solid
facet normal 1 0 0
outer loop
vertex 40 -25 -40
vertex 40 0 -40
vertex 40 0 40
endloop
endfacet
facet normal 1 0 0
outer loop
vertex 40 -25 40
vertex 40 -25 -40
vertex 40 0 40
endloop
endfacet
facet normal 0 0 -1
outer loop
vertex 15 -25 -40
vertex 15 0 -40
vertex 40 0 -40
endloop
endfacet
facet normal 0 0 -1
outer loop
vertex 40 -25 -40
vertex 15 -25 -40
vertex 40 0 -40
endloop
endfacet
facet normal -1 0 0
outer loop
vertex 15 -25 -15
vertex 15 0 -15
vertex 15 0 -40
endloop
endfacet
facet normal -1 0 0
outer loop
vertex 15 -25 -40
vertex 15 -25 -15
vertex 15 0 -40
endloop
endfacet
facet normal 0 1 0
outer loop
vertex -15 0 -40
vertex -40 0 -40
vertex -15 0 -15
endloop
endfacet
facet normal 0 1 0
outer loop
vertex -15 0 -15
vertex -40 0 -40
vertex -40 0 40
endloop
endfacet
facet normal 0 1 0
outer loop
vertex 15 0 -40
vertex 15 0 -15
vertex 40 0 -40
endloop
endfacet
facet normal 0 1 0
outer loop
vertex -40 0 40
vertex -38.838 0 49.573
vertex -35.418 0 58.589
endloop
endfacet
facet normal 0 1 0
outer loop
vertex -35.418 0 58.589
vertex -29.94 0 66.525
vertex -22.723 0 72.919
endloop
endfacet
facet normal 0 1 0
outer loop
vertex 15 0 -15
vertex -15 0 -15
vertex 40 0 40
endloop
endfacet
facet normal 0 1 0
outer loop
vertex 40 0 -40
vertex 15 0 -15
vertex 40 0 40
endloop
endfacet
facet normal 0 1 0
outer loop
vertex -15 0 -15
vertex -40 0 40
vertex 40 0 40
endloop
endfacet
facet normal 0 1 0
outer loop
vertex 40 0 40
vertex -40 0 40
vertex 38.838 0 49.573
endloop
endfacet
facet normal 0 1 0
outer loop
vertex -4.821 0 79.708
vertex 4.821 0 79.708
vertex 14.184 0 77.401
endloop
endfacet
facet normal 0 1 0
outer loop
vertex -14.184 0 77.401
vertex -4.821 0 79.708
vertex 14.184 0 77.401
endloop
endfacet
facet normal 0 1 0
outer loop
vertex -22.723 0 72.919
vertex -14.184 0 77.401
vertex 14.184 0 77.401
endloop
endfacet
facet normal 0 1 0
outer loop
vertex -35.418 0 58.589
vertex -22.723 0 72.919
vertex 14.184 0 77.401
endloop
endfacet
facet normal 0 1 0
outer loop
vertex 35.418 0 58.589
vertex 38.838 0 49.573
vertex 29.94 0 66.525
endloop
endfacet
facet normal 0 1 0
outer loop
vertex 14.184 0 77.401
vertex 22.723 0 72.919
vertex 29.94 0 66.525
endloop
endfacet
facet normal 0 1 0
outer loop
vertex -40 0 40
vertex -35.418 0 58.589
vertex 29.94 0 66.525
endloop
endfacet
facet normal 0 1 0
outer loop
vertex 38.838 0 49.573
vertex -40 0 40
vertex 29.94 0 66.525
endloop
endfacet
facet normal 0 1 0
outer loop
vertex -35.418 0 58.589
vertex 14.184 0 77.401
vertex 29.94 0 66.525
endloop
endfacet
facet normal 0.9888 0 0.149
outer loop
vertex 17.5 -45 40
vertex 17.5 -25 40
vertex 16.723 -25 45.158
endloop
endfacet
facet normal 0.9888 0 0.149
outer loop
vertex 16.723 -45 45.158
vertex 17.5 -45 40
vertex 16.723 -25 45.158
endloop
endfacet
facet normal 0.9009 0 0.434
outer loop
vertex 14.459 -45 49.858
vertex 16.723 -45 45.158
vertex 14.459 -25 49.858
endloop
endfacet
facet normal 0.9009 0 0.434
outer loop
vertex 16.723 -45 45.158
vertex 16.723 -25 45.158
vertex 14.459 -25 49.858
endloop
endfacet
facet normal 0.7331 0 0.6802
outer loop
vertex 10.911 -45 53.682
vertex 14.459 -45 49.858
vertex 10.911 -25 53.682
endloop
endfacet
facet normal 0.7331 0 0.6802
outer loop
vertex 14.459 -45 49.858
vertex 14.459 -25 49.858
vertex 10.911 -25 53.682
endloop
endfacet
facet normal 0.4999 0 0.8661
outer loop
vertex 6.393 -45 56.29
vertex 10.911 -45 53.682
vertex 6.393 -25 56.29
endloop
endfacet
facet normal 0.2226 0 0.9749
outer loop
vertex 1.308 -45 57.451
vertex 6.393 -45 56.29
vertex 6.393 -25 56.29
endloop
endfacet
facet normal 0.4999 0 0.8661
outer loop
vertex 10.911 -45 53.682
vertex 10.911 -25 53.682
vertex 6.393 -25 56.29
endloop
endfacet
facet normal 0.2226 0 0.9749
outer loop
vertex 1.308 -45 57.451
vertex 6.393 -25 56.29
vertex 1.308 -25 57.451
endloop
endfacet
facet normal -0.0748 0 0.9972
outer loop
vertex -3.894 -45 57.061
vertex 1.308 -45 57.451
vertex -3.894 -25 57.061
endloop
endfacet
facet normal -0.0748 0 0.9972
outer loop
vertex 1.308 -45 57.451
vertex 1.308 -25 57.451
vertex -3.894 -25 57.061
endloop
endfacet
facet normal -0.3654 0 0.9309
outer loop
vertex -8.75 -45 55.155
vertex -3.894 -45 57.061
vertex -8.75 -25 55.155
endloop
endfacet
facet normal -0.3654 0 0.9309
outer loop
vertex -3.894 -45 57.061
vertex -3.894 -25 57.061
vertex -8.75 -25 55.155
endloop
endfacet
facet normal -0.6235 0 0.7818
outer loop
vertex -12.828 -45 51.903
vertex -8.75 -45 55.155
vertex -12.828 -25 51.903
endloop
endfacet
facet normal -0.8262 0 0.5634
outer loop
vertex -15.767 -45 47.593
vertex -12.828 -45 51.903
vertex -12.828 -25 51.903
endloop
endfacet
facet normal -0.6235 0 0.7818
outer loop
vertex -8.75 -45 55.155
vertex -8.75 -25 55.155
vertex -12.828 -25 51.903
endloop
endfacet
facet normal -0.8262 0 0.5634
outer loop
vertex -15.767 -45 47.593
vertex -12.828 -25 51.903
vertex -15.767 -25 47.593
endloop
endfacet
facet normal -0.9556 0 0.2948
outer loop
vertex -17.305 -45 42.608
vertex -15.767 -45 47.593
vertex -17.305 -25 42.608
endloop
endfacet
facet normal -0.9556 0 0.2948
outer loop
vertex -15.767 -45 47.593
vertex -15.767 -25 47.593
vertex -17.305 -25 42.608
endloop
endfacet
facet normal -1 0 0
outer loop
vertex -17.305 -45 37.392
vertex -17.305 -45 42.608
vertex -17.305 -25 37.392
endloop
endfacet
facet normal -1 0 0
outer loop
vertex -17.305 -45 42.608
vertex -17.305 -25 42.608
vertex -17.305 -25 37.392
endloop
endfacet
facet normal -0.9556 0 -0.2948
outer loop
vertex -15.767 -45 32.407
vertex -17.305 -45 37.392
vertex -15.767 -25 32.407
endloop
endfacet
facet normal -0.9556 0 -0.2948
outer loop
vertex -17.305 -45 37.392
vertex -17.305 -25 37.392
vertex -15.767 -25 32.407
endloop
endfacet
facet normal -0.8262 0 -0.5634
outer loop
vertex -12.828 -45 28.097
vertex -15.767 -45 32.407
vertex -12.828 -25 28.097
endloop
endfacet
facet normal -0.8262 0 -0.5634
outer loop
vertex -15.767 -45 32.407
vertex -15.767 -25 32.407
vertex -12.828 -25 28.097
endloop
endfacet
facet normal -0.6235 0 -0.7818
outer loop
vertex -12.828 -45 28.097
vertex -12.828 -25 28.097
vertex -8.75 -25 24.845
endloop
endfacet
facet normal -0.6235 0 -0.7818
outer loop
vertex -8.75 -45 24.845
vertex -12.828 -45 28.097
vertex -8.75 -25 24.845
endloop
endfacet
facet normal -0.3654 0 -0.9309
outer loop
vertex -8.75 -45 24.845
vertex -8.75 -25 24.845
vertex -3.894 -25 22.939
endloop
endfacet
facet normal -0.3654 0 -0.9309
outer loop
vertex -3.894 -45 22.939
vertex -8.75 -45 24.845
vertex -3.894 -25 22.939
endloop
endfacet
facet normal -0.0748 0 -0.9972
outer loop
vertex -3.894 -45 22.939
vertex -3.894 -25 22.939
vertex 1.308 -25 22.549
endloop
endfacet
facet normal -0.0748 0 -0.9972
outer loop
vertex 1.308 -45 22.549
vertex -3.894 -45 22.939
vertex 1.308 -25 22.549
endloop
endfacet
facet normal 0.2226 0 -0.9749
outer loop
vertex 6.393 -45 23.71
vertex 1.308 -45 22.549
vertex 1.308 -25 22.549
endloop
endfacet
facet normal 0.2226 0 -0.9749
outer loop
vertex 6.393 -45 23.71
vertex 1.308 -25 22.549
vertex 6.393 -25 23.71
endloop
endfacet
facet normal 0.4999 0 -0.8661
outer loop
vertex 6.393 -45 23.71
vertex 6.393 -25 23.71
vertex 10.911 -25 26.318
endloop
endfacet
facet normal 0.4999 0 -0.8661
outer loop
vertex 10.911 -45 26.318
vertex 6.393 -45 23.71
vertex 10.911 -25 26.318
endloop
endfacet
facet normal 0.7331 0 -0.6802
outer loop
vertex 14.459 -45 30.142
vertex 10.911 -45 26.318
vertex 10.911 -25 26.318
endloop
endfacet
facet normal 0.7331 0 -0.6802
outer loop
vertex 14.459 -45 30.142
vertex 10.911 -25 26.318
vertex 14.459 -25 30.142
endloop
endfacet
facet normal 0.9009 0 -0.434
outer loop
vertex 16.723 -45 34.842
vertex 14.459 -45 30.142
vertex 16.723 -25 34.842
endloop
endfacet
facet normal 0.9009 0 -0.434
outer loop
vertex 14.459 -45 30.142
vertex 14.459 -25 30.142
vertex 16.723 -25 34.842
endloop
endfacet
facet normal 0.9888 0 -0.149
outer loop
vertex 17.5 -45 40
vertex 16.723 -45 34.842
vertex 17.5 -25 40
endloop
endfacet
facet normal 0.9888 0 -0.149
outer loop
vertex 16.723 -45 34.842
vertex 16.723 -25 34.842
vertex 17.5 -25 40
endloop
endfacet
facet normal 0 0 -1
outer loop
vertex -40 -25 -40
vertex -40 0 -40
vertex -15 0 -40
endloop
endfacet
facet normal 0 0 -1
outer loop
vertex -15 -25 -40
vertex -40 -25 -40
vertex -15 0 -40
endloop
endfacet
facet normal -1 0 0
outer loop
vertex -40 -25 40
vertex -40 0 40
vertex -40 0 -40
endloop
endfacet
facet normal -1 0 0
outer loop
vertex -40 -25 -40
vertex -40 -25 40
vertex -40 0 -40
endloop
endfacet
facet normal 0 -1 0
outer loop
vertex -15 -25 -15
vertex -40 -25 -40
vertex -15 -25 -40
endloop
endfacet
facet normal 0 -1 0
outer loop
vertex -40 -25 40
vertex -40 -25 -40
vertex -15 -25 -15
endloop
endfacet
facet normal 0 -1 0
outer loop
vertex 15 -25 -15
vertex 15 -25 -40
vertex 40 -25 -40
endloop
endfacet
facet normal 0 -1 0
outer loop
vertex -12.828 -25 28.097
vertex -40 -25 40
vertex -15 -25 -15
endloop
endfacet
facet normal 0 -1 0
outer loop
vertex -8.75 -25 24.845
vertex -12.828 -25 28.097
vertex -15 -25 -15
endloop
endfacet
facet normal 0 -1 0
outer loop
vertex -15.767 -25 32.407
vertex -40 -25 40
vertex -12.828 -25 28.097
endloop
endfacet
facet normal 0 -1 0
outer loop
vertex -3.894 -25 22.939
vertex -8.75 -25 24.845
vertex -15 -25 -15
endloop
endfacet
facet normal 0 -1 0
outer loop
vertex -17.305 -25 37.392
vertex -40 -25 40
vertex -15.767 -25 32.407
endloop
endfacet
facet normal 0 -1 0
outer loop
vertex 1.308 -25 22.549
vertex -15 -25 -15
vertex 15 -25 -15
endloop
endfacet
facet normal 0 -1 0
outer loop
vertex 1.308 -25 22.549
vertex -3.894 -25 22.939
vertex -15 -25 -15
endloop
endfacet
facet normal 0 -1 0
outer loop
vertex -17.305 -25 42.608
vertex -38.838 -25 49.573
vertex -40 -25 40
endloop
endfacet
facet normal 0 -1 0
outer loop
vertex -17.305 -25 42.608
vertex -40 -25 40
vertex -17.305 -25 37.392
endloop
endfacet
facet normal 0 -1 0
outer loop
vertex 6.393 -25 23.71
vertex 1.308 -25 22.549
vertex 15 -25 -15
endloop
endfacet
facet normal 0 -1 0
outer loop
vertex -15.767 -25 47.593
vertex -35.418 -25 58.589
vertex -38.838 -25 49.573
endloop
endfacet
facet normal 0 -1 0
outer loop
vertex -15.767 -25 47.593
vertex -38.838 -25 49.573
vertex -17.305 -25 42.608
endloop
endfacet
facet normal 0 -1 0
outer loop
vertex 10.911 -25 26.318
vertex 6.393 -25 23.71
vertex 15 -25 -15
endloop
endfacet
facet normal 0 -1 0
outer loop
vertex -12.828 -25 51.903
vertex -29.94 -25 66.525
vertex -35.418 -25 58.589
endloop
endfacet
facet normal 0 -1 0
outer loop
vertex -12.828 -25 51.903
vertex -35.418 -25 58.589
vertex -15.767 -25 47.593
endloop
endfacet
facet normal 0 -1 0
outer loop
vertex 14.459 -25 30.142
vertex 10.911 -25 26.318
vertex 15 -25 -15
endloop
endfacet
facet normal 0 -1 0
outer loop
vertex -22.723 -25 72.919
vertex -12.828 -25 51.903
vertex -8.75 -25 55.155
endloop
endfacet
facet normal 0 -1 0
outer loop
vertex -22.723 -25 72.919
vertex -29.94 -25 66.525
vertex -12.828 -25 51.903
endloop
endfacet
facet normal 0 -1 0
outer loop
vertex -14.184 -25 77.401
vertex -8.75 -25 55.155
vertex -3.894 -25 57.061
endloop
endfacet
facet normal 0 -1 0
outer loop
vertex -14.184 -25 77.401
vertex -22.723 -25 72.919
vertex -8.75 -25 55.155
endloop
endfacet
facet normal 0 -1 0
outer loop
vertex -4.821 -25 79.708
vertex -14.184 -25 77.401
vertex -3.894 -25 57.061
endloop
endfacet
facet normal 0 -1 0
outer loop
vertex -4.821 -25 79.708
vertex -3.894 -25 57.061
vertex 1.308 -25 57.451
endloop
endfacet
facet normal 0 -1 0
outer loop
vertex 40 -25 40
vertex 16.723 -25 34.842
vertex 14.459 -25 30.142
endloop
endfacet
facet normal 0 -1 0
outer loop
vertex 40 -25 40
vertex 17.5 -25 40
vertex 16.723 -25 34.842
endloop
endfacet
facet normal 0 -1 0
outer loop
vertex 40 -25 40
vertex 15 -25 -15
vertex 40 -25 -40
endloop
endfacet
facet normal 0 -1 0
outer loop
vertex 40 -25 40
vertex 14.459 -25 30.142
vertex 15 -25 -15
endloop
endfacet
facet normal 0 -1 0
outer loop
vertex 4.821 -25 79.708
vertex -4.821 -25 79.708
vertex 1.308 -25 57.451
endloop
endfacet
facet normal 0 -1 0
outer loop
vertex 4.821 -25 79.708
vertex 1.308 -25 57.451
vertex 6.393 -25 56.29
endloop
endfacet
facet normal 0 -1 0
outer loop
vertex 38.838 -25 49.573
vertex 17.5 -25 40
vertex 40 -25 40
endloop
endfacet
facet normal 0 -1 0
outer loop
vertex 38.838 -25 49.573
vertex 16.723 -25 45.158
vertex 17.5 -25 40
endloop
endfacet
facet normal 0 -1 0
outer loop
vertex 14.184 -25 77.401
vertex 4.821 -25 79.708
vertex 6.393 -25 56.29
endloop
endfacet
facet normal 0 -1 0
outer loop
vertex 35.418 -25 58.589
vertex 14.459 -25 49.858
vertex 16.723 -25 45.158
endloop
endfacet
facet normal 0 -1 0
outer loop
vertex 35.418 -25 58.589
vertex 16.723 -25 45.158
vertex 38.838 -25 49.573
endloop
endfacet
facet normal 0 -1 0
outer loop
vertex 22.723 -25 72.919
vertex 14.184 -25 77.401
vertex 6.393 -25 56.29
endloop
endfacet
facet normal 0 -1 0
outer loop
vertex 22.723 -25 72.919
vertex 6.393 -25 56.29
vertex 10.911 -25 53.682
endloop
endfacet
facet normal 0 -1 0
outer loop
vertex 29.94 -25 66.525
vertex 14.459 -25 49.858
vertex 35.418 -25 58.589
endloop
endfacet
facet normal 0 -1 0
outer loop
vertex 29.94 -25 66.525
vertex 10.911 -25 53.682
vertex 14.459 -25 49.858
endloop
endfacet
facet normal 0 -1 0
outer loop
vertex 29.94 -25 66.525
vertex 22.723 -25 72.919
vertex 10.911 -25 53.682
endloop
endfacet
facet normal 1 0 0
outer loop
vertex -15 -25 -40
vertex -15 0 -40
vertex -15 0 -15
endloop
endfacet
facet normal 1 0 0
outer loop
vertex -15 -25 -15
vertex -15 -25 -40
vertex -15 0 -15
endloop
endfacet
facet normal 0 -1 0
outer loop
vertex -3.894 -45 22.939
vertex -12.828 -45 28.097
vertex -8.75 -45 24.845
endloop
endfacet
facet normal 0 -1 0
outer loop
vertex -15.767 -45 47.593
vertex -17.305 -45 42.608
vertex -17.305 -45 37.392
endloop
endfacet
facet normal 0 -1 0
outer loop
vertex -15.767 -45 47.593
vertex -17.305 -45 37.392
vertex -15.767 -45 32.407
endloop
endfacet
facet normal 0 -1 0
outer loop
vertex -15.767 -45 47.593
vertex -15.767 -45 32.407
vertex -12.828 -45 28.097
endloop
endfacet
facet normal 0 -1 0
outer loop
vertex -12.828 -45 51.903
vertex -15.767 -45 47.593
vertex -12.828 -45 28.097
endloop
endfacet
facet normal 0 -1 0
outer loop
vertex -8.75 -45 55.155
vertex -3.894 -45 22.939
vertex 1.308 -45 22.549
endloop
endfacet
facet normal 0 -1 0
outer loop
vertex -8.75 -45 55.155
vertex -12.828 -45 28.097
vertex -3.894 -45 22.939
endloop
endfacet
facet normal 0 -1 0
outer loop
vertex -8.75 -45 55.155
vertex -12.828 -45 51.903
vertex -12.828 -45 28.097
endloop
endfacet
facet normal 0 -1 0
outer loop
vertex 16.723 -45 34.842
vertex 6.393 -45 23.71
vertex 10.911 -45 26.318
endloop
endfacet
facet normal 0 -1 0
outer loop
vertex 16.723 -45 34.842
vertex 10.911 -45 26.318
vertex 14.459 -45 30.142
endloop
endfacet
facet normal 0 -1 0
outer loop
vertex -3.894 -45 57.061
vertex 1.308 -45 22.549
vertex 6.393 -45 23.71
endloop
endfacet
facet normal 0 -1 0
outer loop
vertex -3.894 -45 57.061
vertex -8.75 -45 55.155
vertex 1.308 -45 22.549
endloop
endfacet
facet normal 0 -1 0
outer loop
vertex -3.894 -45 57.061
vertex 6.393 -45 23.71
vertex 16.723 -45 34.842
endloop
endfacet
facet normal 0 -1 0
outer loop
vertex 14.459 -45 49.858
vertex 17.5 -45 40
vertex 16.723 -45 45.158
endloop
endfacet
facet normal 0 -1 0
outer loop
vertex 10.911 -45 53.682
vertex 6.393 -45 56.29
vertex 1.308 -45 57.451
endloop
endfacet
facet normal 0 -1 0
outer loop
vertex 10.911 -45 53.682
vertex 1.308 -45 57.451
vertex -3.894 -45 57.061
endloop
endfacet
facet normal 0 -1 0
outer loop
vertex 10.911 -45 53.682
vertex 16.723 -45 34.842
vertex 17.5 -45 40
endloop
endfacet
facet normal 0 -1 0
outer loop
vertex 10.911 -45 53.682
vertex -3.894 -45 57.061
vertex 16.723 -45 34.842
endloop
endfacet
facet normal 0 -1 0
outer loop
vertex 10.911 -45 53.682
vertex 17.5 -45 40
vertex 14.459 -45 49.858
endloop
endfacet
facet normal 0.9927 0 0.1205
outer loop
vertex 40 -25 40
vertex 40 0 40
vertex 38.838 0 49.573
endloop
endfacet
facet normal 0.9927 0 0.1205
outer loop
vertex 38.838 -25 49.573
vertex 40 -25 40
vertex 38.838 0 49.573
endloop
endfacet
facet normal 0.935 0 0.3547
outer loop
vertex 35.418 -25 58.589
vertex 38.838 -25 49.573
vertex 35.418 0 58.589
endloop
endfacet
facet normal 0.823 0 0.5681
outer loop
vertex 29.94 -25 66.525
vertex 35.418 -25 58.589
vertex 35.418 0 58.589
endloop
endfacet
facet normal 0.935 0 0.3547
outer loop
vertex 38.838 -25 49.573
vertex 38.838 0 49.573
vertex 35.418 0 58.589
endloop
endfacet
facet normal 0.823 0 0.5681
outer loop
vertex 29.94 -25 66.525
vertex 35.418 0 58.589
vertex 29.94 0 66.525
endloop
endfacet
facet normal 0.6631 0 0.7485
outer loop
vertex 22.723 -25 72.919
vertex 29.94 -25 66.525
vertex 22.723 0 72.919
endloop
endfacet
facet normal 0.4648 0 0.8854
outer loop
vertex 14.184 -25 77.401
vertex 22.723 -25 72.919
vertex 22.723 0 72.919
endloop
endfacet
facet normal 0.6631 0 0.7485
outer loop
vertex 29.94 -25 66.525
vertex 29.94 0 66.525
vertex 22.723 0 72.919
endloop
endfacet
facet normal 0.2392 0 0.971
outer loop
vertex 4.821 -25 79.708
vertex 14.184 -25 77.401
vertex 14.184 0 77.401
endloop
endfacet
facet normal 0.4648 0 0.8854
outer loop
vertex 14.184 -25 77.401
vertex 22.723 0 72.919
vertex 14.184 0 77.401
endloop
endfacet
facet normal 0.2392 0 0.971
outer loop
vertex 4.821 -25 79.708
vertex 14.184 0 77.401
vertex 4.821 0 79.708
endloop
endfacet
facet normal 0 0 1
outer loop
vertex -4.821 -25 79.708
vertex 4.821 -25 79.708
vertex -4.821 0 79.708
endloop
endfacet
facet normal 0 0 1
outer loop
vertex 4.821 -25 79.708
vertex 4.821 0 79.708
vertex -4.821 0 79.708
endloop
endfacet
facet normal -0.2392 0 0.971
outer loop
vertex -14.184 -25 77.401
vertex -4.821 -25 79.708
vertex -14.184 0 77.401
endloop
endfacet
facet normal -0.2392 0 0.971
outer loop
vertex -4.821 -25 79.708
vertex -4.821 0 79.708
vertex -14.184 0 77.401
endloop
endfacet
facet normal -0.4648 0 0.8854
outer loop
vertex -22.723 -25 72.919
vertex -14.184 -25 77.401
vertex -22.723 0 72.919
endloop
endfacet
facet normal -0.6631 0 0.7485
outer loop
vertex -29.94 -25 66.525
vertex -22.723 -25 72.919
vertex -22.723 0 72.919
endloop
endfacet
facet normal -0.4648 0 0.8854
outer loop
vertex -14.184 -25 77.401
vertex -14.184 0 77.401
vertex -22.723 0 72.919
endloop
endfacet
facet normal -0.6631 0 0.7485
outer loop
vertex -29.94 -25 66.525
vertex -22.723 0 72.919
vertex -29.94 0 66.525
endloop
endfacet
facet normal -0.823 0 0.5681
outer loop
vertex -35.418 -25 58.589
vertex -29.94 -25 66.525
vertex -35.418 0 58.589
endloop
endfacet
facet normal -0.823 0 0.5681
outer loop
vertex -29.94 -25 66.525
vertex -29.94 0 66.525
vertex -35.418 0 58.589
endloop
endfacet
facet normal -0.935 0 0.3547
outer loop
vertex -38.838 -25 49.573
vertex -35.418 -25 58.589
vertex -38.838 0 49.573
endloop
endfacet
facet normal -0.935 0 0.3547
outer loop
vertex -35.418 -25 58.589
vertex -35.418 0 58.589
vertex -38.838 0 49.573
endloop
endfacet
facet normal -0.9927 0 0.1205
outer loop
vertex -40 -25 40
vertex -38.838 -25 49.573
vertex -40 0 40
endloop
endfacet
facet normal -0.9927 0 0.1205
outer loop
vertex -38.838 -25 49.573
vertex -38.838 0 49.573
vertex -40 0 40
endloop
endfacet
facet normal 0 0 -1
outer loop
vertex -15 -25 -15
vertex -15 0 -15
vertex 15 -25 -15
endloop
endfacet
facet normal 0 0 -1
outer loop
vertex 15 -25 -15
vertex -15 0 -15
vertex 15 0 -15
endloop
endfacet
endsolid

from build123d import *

# Parameters (mm, degrees)
F1_DEPTH = 25
F2_R     = 17.5
F3_DEPTH = 20


with BuildPart() as f1:
    # F0 (on Front) → F1 (new body)
    with BuildSketch(Plane.XZ):
        with BuildLine():
            Line((15, -40), (40, -40))
            Line((40, -40), (40, 40))
            ThreePointArc((40, 40), (0, 80), (-40, 40))
            Line((-40, 40), (-40, -40))
            Line((-40, -40), (-15, -40))
            Line((-15, -40), (-15, -15))
            Line((-15, -15), (15, -15))
            Line((15, -15), (15, -40))
        make_face()
    extrude(amount=F1_DEPTH)

    # F2 (on face) → F3 (join)
    with BuildSketch(Plane.XZ.offset(25)):
        with Locations((0, 40)):
            Circle(F2_R)
    extrude(amount=F3_DEPTH)


solid = f1.part
